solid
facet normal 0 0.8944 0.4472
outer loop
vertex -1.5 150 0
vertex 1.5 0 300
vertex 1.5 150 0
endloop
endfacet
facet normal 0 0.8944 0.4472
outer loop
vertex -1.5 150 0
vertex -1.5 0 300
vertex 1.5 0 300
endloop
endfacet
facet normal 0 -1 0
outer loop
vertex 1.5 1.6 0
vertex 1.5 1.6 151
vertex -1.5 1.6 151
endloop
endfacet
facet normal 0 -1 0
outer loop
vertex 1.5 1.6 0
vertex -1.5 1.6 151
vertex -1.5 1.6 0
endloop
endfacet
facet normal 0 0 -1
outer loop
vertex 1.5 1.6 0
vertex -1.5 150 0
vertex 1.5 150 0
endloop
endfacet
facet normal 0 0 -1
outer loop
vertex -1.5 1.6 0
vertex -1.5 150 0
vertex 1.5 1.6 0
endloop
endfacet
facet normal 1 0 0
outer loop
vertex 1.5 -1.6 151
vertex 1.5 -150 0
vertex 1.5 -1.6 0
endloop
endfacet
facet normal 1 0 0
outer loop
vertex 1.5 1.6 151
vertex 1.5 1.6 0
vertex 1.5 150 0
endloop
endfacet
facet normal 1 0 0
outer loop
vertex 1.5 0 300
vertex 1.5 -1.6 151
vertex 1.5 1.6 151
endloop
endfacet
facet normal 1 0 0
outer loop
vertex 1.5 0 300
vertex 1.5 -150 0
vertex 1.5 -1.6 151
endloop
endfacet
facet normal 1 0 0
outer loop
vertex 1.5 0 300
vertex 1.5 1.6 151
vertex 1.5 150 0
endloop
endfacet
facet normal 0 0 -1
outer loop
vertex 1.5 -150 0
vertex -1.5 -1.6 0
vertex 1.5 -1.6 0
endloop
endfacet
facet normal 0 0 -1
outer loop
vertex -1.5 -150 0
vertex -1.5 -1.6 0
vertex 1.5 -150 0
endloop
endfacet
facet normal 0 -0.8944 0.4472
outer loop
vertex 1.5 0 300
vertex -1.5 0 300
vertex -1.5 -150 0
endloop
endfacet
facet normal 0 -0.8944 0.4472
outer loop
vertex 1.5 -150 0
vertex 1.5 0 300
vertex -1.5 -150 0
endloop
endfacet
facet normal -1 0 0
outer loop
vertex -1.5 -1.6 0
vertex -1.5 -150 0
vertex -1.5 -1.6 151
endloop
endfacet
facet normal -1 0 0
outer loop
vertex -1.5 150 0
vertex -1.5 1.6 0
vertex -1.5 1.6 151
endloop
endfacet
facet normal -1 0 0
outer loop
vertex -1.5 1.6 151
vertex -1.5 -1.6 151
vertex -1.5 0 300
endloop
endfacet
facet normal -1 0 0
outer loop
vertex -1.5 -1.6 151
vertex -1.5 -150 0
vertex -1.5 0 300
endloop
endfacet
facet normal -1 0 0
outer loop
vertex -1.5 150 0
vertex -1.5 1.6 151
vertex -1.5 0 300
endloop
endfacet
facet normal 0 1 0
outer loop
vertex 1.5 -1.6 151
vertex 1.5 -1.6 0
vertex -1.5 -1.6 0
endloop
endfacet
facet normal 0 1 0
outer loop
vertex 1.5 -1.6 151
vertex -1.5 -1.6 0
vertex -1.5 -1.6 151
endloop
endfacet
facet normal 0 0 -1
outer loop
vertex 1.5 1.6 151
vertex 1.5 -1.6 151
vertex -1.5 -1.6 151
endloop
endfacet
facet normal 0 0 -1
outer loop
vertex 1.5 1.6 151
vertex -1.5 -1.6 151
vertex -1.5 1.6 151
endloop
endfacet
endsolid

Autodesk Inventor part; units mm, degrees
ref_plane "YZ Plane" through (0, 0, 0) normal (1, 0, 0) x (0, 1, 0)
ref_plane "XZ Plane" through (0, 0, 0) normal (0, 1, 0) x (-1, 0, 0)
ref_plane "XY Plane" through (0, 0, 0) normal (0, 0, 1) x (1, 0, 0)
sketch "Sketch1" plane through (0, 0, 0) normal (1, 0, 0) x (0, 1, 0)
  line L0 (150, 0) -> (-150, 0)
  line L1 (0, 0) -> (0, 300)
  line L2 (0, 300) -> (150, 0)
  line L3 (0, 300) -> (-150, 0)
  dimension "d0" = 300
  dimension "d1" = 300
extrude "Plate1" add sketch "Sketch1" along normal mid plane 3
sketch "Sketch3" plane through (1.5, 0, 0) normal (1, 0, 0) x (0, 0, -1)
  line L0 (0, -1.6) -> (-151, -1.6)
  line L1 (-151, -1.6) -> (-151, 1.6)
  line L2 (-151, 1.6) -> (0, 1.6)
  line L3 (0, 1.6) -> (0, -1.6)
  line L4 (0, 150) -> (0, -150) projected
  point P0 (0, 0)
  point P1 (0, 0)
  dimension "d7" = 3.2
  dimension "d8" = 151
extrude "Extrusion2" cut sketch "Sketch3" against normal through all
equation "\"d2\" = Thickness"
equation "\"BendReliefWidth\" = Thickness"
equation "\"BendReliefDepth\" = 0.5 * Thickness"
equation "\"CornerReliefSize\" = 4 * Thickness"
equation "\"MinimumRemnant\" = 2 * Thickness"
equation "\"TransitionRadius\" = BendRadius"
equation "\"JacobiRadiusSize\" = BendRadius"
equation "\"GapSize\" = Thickness"
equation "\"Thickness\" = 3"
equation "\"BendRadius\" = 5"
properties part number "MSC 207 CONE BLADE" material "Stainless Steel"
